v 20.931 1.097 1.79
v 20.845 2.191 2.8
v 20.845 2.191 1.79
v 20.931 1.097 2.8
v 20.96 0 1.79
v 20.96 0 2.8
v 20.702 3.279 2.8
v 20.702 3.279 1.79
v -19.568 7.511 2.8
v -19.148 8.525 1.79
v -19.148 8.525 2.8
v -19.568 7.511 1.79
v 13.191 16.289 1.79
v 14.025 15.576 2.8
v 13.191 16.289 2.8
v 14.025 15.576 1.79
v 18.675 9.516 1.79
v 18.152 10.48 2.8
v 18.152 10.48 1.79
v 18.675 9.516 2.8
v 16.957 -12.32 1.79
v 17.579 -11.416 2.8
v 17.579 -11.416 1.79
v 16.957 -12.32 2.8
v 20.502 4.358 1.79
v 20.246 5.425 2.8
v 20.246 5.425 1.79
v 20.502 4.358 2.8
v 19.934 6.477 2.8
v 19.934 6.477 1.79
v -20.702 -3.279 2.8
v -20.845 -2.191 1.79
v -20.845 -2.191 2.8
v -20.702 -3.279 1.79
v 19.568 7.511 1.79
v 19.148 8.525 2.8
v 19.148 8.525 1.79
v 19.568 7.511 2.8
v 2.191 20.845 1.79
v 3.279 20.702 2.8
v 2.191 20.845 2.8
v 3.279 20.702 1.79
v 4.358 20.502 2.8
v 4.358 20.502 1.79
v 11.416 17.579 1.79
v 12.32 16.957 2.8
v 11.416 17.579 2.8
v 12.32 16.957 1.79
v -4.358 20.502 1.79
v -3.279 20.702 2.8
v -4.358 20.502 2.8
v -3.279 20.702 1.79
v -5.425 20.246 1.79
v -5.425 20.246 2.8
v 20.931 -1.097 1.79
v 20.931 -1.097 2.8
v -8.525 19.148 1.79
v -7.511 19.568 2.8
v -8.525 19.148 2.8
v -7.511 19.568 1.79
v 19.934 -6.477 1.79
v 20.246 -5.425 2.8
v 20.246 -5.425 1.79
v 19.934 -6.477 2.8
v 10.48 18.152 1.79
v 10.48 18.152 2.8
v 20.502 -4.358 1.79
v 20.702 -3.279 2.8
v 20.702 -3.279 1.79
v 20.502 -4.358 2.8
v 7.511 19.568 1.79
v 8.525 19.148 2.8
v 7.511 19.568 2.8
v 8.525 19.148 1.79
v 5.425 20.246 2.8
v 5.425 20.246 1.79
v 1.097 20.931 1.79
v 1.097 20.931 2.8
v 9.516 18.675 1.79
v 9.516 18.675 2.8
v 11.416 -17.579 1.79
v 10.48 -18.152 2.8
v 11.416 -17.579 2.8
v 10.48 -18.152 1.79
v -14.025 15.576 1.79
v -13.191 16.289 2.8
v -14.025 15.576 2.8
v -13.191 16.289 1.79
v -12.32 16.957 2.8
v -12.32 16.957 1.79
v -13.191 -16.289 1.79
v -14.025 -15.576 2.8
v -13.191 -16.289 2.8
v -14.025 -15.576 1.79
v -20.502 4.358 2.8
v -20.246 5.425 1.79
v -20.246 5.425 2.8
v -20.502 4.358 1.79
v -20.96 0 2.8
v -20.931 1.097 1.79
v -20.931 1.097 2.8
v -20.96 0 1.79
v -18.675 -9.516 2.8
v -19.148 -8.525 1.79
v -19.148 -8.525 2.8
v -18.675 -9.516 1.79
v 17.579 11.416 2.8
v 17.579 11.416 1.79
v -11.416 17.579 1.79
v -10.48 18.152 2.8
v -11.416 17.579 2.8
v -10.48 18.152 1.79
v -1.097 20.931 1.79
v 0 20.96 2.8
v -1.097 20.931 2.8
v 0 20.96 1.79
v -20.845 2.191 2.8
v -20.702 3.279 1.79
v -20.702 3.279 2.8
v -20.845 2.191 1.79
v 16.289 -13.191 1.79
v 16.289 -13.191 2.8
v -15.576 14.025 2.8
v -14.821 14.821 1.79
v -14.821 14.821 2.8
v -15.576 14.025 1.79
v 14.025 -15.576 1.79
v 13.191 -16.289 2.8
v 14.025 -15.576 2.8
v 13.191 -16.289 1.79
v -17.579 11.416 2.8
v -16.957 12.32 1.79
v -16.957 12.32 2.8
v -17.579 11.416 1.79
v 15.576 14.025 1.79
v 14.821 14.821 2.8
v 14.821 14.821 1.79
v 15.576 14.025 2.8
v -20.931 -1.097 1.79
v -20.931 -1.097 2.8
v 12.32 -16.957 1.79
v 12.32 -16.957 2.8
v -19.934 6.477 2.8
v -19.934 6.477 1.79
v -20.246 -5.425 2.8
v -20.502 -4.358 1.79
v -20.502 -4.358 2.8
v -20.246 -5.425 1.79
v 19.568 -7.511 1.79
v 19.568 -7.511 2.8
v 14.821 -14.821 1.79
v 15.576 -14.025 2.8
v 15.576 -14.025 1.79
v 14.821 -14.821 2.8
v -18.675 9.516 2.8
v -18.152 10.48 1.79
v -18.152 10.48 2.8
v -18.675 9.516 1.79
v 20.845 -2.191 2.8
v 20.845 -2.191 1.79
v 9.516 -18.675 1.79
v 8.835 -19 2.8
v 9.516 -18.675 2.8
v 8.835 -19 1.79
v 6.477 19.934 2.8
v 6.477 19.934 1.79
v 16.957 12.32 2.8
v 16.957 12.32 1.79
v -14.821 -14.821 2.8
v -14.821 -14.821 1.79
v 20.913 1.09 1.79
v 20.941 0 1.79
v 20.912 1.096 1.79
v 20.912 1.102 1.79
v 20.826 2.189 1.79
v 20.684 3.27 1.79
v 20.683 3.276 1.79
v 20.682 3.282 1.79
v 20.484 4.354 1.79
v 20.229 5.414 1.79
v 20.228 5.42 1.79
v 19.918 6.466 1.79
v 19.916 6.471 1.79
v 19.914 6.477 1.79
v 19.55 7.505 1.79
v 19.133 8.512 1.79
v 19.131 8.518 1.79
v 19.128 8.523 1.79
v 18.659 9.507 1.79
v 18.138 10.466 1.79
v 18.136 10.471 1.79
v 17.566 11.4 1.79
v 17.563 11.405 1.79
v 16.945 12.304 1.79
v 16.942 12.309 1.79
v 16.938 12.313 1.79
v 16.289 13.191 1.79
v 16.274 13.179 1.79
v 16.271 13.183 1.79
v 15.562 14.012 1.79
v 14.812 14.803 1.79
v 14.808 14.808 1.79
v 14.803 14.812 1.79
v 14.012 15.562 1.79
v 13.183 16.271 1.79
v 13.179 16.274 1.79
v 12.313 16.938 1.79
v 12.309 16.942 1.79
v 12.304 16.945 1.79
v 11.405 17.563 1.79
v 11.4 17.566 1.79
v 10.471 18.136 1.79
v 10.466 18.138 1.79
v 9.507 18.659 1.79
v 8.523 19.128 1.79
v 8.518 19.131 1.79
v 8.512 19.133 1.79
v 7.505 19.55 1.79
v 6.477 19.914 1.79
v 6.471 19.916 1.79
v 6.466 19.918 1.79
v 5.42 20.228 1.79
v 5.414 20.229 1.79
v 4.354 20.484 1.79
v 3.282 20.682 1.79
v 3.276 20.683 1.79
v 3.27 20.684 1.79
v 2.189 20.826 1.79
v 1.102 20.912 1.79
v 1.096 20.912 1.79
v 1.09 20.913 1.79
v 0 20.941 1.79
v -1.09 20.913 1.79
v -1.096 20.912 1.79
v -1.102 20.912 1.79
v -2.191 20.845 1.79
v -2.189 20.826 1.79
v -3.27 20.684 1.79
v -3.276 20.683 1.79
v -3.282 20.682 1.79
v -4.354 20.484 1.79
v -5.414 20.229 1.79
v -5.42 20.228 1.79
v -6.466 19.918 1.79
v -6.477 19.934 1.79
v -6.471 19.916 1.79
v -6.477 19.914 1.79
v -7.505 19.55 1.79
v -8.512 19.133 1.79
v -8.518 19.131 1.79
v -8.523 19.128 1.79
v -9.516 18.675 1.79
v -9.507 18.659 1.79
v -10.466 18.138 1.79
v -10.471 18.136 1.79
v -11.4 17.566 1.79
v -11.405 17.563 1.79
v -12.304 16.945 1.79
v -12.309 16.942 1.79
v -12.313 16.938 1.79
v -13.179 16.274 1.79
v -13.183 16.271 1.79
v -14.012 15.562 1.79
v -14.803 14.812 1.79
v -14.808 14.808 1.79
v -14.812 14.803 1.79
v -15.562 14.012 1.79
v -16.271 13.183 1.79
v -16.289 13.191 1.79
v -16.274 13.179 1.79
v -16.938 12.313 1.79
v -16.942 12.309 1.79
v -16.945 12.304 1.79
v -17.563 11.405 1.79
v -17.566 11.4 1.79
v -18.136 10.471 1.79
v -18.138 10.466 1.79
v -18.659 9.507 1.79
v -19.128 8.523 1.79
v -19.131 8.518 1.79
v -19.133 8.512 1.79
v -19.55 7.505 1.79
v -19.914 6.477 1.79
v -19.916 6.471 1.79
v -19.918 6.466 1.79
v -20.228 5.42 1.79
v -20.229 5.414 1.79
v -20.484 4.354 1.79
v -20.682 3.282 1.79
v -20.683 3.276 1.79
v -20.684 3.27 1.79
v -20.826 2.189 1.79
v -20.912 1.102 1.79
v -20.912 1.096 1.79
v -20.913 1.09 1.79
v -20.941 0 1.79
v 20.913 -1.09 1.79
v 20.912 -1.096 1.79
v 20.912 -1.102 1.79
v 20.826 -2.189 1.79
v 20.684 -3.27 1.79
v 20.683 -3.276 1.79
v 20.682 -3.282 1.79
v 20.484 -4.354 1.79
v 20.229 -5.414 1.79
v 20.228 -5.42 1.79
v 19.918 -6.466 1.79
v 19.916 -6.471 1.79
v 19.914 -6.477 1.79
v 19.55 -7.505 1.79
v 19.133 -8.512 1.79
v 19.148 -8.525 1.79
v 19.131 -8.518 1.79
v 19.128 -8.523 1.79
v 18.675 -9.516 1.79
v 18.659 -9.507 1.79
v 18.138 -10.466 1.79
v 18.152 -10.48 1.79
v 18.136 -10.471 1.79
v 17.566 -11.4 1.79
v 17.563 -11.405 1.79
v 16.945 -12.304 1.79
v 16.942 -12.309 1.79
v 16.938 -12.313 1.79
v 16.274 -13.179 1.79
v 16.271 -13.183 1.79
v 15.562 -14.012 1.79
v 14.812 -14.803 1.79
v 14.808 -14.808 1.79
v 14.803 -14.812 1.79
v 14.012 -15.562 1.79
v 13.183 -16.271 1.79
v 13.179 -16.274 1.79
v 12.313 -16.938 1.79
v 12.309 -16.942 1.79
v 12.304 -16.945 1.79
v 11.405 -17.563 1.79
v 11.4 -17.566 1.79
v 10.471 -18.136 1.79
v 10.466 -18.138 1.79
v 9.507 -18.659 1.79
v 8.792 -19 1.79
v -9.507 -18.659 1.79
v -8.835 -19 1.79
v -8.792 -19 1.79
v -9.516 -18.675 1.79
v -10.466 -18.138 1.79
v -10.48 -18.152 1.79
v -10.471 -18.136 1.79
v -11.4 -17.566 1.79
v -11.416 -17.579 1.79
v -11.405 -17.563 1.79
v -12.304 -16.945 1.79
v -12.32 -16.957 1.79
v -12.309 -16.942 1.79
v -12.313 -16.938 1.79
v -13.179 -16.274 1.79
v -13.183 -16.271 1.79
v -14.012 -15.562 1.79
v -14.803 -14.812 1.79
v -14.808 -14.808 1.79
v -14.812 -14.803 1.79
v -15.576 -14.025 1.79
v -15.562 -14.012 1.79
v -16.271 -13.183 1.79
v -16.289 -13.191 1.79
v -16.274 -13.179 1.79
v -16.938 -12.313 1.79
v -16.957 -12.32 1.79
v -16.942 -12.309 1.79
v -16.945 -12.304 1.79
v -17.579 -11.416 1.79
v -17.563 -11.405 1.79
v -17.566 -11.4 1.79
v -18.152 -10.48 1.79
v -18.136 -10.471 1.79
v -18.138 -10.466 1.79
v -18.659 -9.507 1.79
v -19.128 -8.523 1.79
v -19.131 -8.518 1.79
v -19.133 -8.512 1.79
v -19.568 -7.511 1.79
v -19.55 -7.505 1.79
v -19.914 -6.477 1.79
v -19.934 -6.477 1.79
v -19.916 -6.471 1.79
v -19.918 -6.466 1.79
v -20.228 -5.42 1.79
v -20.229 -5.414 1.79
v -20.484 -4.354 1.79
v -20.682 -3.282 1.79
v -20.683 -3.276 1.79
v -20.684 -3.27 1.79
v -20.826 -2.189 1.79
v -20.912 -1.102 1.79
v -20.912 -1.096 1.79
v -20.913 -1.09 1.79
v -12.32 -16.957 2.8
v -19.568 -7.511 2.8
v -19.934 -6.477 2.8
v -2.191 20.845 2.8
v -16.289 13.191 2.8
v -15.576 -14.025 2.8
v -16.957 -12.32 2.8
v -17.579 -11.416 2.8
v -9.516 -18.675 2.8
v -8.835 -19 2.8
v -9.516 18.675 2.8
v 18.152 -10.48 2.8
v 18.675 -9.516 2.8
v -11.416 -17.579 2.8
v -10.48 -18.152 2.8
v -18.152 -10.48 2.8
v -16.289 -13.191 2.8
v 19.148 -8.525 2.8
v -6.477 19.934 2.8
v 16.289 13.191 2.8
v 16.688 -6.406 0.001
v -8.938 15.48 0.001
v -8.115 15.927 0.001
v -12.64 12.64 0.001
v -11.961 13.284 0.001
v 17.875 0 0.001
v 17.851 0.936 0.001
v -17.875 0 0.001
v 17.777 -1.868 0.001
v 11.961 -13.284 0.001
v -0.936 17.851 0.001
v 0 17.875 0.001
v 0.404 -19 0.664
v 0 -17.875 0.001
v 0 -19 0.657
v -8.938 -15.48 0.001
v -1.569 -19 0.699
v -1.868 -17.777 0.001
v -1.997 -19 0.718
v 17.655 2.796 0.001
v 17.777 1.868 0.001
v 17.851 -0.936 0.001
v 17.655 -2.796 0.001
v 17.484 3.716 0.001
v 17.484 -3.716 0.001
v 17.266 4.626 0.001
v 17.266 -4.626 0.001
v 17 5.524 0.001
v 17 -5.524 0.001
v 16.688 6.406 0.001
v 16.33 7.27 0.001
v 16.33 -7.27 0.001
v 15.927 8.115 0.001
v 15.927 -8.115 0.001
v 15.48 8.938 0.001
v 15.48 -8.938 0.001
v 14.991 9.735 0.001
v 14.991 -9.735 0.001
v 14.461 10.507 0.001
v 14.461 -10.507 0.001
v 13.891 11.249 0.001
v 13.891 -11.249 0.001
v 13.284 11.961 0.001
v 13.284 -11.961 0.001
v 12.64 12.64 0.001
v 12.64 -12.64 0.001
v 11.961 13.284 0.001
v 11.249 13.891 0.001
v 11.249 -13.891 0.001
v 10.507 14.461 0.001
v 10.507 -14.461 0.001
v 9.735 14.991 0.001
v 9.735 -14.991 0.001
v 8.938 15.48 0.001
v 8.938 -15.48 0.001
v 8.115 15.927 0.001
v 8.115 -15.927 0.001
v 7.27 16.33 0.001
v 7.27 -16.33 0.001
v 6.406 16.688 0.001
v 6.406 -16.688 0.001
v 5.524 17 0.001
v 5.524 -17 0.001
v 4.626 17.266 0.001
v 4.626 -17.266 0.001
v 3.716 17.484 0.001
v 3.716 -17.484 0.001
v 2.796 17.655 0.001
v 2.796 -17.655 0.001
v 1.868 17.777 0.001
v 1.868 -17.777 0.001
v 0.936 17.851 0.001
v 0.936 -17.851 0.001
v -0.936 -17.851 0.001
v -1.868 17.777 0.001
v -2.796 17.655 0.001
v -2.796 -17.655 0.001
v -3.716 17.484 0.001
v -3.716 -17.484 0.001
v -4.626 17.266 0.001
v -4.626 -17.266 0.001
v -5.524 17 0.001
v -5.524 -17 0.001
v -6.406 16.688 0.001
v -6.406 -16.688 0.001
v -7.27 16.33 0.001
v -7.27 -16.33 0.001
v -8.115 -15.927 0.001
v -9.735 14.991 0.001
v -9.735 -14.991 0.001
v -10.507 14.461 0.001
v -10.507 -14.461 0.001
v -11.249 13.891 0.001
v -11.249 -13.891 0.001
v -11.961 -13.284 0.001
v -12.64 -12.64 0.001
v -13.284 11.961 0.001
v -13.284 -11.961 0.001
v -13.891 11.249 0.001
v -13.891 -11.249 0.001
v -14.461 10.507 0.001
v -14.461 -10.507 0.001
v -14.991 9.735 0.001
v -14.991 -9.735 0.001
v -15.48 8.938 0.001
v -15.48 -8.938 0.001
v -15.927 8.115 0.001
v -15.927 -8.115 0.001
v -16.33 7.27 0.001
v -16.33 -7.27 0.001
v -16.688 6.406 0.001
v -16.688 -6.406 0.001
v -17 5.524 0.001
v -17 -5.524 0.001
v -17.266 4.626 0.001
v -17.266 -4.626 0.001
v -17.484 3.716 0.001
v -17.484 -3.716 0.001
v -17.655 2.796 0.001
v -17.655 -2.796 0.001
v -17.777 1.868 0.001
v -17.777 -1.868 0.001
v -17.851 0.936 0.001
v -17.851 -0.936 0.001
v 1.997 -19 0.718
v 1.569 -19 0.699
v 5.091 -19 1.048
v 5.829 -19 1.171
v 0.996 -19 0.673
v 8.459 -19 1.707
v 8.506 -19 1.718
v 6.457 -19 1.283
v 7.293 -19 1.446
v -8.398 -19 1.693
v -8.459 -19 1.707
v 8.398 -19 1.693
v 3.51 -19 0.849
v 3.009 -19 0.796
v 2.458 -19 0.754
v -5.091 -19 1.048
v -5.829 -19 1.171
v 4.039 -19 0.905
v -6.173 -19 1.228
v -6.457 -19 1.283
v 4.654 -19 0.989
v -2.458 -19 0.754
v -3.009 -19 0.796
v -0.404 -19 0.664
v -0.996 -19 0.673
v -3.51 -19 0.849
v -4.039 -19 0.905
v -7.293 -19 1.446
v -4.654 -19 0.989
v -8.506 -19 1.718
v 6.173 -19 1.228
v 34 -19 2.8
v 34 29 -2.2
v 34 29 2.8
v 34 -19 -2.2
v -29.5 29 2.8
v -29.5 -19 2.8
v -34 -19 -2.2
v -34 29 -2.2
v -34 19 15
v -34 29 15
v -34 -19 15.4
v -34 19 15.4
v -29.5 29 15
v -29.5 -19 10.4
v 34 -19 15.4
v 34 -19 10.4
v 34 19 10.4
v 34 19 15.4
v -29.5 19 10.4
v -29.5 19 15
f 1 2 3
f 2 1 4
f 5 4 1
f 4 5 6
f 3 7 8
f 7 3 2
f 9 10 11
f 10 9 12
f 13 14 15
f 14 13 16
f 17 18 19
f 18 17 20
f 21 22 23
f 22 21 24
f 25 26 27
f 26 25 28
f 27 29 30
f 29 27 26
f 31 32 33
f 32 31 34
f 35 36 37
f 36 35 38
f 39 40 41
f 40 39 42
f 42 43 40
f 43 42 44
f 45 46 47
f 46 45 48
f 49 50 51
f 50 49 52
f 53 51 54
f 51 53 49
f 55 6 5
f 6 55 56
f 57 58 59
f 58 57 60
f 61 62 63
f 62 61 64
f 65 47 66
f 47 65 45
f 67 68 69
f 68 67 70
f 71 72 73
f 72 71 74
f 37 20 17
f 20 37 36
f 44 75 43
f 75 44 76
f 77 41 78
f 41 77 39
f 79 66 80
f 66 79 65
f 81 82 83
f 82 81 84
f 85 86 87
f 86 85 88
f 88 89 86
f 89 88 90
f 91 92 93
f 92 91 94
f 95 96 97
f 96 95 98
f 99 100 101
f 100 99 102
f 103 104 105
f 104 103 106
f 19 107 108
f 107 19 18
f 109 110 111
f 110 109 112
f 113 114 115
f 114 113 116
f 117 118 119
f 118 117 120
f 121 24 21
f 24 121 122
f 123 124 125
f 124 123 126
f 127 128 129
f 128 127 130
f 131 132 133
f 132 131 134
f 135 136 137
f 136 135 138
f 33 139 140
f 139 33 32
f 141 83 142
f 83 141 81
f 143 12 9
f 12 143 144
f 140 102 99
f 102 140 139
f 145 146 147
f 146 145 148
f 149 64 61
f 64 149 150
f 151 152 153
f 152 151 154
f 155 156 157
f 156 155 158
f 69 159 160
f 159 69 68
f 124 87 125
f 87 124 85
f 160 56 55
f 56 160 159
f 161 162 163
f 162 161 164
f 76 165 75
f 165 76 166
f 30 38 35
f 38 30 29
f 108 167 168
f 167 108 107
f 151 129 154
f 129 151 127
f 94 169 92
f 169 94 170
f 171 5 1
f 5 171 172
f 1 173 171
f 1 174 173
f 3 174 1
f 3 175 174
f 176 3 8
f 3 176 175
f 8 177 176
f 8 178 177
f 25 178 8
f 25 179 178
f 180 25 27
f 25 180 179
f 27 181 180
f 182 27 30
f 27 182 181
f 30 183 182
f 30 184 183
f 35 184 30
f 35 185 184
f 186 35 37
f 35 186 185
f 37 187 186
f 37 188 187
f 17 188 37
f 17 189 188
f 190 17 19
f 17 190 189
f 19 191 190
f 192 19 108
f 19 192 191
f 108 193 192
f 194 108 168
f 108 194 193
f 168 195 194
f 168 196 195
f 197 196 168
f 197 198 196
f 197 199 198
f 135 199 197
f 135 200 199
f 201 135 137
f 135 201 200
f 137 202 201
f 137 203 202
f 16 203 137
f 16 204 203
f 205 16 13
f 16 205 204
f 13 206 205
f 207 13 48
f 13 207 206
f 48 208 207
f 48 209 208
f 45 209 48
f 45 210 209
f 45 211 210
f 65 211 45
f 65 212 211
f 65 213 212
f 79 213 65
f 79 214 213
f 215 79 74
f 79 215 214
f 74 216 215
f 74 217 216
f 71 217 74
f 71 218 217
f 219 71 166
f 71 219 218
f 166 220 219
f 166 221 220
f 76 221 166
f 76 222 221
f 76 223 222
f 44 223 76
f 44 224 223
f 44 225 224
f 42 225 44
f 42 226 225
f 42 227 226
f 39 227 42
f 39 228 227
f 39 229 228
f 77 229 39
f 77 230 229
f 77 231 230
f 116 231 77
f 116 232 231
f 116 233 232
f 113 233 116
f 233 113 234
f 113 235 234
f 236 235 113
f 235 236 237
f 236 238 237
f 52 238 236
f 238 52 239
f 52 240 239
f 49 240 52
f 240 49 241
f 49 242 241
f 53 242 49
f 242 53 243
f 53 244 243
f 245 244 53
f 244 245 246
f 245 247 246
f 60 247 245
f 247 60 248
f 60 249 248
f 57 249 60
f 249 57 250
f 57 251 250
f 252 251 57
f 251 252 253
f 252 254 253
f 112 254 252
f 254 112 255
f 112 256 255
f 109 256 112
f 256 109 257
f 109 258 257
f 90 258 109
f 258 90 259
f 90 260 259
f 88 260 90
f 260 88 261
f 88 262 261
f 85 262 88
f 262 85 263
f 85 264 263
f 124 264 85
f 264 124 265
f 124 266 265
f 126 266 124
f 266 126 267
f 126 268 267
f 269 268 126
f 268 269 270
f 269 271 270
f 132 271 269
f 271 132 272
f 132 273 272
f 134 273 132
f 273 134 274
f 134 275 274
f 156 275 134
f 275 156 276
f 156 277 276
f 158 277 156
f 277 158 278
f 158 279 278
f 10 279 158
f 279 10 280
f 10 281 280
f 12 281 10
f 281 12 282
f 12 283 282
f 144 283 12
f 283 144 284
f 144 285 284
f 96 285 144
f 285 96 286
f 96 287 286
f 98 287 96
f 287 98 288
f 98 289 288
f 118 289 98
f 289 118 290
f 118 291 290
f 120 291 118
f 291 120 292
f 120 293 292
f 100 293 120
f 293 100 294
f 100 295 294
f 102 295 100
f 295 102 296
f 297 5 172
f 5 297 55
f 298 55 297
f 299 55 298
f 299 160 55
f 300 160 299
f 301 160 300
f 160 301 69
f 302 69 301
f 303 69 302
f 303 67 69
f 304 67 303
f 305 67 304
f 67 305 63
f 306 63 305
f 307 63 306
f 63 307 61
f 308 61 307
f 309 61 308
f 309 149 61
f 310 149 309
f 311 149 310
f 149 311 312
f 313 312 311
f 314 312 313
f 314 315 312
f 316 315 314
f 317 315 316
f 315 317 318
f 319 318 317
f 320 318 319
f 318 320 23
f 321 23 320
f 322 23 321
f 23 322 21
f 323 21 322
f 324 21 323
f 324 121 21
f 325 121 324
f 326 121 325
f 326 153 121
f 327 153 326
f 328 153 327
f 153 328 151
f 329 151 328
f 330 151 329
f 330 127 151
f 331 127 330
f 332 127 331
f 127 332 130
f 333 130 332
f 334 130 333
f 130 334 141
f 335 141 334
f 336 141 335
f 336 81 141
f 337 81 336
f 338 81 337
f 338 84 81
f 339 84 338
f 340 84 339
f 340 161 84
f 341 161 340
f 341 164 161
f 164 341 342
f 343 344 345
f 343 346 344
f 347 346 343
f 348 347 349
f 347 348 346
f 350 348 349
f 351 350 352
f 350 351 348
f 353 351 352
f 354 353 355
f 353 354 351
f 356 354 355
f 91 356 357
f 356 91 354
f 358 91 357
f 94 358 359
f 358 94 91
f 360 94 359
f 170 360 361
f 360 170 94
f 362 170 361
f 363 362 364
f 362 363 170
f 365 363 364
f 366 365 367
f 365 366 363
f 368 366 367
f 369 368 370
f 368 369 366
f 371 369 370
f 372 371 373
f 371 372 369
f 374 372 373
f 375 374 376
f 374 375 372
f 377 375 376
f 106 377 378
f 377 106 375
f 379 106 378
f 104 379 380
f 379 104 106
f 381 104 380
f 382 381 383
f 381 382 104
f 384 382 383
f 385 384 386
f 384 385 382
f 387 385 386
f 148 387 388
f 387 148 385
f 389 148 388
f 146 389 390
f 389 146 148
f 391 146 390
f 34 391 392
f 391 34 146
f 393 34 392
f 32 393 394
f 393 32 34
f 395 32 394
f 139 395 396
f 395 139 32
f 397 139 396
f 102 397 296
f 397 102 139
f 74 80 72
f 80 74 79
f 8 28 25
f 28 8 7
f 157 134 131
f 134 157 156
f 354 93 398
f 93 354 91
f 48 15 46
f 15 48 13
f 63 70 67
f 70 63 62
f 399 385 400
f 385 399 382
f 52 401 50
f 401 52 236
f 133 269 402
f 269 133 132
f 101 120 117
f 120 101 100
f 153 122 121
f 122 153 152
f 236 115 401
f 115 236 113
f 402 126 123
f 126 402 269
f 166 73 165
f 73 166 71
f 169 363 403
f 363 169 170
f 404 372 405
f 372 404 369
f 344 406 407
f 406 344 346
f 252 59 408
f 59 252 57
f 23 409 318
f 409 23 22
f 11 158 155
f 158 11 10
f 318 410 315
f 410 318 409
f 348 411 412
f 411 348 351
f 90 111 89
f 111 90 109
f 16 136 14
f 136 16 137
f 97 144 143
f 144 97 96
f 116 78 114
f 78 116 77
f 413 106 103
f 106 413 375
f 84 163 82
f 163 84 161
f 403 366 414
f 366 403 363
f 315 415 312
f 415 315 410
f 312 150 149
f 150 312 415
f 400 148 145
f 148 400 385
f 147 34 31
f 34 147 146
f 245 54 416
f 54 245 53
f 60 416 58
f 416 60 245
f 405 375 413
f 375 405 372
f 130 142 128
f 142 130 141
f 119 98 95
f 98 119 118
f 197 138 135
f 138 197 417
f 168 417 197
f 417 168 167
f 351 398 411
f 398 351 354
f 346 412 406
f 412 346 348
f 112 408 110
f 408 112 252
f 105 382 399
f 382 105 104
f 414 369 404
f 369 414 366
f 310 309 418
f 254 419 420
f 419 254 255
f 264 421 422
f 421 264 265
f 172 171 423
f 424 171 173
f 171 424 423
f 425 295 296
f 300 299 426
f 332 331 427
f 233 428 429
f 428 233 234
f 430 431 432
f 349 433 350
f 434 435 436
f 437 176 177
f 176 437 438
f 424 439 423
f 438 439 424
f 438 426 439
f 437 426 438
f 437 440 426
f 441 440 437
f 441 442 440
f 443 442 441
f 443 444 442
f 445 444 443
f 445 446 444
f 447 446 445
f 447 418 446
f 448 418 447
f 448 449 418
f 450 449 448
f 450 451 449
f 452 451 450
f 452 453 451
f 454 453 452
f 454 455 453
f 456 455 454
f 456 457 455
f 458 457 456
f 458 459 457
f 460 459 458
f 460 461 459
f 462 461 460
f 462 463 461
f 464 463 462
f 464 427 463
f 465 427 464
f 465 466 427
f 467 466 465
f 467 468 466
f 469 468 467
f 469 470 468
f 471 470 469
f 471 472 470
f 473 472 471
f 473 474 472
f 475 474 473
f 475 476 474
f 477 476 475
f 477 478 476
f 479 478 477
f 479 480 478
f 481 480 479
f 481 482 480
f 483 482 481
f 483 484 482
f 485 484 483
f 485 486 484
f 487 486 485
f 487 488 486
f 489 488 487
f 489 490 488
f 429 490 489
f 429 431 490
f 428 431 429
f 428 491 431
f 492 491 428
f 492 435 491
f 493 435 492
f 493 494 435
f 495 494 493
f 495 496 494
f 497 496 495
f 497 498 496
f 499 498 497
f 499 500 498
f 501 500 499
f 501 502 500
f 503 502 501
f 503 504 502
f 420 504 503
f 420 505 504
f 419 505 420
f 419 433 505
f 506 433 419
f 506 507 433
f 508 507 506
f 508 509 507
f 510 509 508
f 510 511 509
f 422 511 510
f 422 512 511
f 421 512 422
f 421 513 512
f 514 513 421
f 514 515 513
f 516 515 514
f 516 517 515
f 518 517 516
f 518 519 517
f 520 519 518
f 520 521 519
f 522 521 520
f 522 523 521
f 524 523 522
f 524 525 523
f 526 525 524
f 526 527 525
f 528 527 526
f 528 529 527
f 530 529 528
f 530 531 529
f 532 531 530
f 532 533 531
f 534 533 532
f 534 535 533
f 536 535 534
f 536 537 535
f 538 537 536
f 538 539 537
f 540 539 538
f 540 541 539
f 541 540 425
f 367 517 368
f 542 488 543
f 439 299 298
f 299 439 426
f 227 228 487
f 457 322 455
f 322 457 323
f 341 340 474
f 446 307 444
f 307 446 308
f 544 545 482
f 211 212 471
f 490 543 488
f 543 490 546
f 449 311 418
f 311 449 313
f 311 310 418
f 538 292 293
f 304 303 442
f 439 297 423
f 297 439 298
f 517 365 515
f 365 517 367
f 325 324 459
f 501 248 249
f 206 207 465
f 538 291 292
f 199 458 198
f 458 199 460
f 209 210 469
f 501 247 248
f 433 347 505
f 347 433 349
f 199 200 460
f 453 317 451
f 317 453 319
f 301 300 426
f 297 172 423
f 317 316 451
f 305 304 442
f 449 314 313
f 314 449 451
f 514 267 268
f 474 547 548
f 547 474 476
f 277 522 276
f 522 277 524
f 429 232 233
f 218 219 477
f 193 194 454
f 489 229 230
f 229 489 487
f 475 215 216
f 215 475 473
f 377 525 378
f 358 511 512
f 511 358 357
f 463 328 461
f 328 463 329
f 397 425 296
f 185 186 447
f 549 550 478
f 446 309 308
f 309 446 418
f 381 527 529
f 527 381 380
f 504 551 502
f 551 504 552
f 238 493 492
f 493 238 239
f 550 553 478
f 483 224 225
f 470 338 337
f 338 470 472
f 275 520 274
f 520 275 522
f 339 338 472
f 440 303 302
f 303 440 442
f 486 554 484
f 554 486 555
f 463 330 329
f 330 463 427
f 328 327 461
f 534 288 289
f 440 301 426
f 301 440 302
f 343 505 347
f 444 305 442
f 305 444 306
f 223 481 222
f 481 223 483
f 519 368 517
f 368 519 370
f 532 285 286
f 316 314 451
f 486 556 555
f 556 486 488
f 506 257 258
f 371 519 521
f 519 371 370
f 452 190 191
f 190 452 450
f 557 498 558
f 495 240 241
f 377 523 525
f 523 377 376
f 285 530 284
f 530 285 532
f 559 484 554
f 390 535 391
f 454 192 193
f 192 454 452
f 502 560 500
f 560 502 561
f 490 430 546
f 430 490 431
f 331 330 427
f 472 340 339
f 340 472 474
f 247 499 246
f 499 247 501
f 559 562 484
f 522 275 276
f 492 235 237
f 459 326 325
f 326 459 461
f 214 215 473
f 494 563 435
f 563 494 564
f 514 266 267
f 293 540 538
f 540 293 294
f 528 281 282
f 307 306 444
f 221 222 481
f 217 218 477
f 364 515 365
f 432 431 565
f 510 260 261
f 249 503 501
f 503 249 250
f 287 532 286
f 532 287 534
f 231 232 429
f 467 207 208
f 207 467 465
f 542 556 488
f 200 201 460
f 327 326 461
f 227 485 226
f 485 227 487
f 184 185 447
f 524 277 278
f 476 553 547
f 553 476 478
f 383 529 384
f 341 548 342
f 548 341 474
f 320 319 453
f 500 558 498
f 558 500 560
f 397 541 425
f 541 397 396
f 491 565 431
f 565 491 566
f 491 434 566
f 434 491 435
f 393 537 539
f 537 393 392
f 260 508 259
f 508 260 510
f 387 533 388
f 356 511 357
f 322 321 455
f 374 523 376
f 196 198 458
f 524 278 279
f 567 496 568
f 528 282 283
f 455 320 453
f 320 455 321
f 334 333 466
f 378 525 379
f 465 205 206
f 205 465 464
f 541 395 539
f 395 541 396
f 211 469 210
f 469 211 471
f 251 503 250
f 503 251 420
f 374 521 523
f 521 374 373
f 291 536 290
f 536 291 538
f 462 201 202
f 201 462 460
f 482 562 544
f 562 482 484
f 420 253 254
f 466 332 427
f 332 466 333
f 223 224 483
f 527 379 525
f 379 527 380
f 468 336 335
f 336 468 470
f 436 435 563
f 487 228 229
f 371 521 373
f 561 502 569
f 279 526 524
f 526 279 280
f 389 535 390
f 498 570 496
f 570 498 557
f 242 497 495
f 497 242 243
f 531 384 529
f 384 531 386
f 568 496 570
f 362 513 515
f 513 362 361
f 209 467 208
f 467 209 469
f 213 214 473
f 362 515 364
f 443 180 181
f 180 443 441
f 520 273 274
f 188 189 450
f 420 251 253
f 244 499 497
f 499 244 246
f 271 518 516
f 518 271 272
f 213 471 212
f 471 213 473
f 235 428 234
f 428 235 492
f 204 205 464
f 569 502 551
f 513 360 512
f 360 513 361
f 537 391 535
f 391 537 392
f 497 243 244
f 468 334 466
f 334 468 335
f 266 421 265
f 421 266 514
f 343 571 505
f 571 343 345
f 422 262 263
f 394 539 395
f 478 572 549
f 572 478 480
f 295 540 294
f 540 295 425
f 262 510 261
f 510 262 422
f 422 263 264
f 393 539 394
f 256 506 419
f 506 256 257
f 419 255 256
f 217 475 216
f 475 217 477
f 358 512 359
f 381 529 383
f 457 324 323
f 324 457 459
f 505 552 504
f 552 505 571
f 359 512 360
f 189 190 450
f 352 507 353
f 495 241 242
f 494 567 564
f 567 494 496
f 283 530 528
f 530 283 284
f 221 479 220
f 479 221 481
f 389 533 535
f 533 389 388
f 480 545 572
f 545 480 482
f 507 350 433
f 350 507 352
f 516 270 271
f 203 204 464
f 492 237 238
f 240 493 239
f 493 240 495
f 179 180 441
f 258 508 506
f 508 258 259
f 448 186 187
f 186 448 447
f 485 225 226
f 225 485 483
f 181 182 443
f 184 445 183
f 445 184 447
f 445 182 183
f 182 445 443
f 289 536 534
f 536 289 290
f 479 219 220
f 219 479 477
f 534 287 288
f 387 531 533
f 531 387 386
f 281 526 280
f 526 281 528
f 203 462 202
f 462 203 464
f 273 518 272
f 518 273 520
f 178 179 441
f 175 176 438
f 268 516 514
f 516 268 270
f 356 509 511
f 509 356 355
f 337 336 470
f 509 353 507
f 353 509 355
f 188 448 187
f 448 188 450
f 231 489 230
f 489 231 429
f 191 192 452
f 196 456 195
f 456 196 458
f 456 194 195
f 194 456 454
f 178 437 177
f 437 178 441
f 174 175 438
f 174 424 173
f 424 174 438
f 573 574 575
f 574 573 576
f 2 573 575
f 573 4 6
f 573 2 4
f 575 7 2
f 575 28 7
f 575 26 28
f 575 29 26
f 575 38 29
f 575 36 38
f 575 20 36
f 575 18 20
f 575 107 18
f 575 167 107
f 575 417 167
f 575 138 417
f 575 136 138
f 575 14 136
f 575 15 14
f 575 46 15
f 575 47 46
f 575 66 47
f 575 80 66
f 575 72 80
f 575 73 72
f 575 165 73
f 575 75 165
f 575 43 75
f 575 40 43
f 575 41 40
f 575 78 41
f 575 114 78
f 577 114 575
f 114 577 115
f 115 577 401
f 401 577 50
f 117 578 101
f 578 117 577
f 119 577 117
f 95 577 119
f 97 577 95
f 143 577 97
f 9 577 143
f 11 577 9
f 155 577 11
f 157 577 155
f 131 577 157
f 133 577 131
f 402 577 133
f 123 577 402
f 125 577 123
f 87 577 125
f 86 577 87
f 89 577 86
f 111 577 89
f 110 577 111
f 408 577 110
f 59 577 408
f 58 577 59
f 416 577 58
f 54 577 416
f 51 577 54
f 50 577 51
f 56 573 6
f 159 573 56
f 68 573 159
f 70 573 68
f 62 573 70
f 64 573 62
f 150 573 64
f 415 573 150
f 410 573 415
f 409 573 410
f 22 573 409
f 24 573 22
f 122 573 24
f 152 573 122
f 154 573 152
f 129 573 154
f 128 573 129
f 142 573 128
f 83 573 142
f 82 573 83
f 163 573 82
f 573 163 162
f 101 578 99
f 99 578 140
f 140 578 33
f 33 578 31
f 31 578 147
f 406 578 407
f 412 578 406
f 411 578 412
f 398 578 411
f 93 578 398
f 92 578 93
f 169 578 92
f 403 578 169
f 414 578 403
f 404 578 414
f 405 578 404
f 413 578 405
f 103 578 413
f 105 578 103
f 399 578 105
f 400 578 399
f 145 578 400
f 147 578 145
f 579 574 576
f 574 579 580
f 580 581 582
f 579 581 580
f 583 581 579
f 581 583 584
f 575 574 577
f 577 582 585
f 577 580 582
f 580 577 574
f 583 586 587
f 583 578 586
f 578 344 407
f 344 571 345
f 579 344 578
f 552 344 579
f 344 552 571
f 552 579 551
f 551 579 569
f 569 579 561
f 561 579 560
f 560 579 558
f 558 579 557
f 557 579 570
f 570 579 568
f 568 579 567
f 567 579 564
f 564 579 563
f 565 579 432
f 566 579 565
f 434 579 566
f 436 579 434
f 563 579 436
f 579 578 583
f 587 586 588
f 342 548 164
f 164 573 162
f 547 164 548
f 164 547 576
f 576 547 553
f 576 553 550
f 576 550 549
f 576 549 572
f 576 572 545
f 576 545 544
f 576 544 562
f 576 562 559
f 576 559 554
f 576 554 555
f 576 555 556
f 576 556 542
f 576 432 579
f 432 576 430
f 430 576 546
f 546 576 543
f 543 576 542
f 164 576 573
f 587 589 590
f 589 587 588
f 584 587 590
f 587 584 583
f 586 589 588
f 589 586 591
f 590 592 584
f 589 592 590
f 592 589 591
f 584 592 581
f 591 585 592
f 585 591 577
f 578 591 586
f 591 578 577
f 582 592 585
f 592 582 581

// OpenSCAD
$fn=120;

h=1.8;
height=5;
    
translate([0,0,1+h-height])
difference() {
translate([-68/2,-38/2,0]) cube([68,48,5]);
    union() {
        translate([0,0,height-1-.01]) cylinder(d=41.92,h=6);
        translate([0,0,height-1-h+.01]) cylinder(d=35.75,h=5);
        translate([0,0,height-1-h+.001]) cylinder(d1=35.75,d2=41.92,h=h);
    }
}

translate([-68/2,-38/2,10.4]) cube([68,38,5]);
translate([-68/2,-38/2,0]) cube([4.5,48,15]);
